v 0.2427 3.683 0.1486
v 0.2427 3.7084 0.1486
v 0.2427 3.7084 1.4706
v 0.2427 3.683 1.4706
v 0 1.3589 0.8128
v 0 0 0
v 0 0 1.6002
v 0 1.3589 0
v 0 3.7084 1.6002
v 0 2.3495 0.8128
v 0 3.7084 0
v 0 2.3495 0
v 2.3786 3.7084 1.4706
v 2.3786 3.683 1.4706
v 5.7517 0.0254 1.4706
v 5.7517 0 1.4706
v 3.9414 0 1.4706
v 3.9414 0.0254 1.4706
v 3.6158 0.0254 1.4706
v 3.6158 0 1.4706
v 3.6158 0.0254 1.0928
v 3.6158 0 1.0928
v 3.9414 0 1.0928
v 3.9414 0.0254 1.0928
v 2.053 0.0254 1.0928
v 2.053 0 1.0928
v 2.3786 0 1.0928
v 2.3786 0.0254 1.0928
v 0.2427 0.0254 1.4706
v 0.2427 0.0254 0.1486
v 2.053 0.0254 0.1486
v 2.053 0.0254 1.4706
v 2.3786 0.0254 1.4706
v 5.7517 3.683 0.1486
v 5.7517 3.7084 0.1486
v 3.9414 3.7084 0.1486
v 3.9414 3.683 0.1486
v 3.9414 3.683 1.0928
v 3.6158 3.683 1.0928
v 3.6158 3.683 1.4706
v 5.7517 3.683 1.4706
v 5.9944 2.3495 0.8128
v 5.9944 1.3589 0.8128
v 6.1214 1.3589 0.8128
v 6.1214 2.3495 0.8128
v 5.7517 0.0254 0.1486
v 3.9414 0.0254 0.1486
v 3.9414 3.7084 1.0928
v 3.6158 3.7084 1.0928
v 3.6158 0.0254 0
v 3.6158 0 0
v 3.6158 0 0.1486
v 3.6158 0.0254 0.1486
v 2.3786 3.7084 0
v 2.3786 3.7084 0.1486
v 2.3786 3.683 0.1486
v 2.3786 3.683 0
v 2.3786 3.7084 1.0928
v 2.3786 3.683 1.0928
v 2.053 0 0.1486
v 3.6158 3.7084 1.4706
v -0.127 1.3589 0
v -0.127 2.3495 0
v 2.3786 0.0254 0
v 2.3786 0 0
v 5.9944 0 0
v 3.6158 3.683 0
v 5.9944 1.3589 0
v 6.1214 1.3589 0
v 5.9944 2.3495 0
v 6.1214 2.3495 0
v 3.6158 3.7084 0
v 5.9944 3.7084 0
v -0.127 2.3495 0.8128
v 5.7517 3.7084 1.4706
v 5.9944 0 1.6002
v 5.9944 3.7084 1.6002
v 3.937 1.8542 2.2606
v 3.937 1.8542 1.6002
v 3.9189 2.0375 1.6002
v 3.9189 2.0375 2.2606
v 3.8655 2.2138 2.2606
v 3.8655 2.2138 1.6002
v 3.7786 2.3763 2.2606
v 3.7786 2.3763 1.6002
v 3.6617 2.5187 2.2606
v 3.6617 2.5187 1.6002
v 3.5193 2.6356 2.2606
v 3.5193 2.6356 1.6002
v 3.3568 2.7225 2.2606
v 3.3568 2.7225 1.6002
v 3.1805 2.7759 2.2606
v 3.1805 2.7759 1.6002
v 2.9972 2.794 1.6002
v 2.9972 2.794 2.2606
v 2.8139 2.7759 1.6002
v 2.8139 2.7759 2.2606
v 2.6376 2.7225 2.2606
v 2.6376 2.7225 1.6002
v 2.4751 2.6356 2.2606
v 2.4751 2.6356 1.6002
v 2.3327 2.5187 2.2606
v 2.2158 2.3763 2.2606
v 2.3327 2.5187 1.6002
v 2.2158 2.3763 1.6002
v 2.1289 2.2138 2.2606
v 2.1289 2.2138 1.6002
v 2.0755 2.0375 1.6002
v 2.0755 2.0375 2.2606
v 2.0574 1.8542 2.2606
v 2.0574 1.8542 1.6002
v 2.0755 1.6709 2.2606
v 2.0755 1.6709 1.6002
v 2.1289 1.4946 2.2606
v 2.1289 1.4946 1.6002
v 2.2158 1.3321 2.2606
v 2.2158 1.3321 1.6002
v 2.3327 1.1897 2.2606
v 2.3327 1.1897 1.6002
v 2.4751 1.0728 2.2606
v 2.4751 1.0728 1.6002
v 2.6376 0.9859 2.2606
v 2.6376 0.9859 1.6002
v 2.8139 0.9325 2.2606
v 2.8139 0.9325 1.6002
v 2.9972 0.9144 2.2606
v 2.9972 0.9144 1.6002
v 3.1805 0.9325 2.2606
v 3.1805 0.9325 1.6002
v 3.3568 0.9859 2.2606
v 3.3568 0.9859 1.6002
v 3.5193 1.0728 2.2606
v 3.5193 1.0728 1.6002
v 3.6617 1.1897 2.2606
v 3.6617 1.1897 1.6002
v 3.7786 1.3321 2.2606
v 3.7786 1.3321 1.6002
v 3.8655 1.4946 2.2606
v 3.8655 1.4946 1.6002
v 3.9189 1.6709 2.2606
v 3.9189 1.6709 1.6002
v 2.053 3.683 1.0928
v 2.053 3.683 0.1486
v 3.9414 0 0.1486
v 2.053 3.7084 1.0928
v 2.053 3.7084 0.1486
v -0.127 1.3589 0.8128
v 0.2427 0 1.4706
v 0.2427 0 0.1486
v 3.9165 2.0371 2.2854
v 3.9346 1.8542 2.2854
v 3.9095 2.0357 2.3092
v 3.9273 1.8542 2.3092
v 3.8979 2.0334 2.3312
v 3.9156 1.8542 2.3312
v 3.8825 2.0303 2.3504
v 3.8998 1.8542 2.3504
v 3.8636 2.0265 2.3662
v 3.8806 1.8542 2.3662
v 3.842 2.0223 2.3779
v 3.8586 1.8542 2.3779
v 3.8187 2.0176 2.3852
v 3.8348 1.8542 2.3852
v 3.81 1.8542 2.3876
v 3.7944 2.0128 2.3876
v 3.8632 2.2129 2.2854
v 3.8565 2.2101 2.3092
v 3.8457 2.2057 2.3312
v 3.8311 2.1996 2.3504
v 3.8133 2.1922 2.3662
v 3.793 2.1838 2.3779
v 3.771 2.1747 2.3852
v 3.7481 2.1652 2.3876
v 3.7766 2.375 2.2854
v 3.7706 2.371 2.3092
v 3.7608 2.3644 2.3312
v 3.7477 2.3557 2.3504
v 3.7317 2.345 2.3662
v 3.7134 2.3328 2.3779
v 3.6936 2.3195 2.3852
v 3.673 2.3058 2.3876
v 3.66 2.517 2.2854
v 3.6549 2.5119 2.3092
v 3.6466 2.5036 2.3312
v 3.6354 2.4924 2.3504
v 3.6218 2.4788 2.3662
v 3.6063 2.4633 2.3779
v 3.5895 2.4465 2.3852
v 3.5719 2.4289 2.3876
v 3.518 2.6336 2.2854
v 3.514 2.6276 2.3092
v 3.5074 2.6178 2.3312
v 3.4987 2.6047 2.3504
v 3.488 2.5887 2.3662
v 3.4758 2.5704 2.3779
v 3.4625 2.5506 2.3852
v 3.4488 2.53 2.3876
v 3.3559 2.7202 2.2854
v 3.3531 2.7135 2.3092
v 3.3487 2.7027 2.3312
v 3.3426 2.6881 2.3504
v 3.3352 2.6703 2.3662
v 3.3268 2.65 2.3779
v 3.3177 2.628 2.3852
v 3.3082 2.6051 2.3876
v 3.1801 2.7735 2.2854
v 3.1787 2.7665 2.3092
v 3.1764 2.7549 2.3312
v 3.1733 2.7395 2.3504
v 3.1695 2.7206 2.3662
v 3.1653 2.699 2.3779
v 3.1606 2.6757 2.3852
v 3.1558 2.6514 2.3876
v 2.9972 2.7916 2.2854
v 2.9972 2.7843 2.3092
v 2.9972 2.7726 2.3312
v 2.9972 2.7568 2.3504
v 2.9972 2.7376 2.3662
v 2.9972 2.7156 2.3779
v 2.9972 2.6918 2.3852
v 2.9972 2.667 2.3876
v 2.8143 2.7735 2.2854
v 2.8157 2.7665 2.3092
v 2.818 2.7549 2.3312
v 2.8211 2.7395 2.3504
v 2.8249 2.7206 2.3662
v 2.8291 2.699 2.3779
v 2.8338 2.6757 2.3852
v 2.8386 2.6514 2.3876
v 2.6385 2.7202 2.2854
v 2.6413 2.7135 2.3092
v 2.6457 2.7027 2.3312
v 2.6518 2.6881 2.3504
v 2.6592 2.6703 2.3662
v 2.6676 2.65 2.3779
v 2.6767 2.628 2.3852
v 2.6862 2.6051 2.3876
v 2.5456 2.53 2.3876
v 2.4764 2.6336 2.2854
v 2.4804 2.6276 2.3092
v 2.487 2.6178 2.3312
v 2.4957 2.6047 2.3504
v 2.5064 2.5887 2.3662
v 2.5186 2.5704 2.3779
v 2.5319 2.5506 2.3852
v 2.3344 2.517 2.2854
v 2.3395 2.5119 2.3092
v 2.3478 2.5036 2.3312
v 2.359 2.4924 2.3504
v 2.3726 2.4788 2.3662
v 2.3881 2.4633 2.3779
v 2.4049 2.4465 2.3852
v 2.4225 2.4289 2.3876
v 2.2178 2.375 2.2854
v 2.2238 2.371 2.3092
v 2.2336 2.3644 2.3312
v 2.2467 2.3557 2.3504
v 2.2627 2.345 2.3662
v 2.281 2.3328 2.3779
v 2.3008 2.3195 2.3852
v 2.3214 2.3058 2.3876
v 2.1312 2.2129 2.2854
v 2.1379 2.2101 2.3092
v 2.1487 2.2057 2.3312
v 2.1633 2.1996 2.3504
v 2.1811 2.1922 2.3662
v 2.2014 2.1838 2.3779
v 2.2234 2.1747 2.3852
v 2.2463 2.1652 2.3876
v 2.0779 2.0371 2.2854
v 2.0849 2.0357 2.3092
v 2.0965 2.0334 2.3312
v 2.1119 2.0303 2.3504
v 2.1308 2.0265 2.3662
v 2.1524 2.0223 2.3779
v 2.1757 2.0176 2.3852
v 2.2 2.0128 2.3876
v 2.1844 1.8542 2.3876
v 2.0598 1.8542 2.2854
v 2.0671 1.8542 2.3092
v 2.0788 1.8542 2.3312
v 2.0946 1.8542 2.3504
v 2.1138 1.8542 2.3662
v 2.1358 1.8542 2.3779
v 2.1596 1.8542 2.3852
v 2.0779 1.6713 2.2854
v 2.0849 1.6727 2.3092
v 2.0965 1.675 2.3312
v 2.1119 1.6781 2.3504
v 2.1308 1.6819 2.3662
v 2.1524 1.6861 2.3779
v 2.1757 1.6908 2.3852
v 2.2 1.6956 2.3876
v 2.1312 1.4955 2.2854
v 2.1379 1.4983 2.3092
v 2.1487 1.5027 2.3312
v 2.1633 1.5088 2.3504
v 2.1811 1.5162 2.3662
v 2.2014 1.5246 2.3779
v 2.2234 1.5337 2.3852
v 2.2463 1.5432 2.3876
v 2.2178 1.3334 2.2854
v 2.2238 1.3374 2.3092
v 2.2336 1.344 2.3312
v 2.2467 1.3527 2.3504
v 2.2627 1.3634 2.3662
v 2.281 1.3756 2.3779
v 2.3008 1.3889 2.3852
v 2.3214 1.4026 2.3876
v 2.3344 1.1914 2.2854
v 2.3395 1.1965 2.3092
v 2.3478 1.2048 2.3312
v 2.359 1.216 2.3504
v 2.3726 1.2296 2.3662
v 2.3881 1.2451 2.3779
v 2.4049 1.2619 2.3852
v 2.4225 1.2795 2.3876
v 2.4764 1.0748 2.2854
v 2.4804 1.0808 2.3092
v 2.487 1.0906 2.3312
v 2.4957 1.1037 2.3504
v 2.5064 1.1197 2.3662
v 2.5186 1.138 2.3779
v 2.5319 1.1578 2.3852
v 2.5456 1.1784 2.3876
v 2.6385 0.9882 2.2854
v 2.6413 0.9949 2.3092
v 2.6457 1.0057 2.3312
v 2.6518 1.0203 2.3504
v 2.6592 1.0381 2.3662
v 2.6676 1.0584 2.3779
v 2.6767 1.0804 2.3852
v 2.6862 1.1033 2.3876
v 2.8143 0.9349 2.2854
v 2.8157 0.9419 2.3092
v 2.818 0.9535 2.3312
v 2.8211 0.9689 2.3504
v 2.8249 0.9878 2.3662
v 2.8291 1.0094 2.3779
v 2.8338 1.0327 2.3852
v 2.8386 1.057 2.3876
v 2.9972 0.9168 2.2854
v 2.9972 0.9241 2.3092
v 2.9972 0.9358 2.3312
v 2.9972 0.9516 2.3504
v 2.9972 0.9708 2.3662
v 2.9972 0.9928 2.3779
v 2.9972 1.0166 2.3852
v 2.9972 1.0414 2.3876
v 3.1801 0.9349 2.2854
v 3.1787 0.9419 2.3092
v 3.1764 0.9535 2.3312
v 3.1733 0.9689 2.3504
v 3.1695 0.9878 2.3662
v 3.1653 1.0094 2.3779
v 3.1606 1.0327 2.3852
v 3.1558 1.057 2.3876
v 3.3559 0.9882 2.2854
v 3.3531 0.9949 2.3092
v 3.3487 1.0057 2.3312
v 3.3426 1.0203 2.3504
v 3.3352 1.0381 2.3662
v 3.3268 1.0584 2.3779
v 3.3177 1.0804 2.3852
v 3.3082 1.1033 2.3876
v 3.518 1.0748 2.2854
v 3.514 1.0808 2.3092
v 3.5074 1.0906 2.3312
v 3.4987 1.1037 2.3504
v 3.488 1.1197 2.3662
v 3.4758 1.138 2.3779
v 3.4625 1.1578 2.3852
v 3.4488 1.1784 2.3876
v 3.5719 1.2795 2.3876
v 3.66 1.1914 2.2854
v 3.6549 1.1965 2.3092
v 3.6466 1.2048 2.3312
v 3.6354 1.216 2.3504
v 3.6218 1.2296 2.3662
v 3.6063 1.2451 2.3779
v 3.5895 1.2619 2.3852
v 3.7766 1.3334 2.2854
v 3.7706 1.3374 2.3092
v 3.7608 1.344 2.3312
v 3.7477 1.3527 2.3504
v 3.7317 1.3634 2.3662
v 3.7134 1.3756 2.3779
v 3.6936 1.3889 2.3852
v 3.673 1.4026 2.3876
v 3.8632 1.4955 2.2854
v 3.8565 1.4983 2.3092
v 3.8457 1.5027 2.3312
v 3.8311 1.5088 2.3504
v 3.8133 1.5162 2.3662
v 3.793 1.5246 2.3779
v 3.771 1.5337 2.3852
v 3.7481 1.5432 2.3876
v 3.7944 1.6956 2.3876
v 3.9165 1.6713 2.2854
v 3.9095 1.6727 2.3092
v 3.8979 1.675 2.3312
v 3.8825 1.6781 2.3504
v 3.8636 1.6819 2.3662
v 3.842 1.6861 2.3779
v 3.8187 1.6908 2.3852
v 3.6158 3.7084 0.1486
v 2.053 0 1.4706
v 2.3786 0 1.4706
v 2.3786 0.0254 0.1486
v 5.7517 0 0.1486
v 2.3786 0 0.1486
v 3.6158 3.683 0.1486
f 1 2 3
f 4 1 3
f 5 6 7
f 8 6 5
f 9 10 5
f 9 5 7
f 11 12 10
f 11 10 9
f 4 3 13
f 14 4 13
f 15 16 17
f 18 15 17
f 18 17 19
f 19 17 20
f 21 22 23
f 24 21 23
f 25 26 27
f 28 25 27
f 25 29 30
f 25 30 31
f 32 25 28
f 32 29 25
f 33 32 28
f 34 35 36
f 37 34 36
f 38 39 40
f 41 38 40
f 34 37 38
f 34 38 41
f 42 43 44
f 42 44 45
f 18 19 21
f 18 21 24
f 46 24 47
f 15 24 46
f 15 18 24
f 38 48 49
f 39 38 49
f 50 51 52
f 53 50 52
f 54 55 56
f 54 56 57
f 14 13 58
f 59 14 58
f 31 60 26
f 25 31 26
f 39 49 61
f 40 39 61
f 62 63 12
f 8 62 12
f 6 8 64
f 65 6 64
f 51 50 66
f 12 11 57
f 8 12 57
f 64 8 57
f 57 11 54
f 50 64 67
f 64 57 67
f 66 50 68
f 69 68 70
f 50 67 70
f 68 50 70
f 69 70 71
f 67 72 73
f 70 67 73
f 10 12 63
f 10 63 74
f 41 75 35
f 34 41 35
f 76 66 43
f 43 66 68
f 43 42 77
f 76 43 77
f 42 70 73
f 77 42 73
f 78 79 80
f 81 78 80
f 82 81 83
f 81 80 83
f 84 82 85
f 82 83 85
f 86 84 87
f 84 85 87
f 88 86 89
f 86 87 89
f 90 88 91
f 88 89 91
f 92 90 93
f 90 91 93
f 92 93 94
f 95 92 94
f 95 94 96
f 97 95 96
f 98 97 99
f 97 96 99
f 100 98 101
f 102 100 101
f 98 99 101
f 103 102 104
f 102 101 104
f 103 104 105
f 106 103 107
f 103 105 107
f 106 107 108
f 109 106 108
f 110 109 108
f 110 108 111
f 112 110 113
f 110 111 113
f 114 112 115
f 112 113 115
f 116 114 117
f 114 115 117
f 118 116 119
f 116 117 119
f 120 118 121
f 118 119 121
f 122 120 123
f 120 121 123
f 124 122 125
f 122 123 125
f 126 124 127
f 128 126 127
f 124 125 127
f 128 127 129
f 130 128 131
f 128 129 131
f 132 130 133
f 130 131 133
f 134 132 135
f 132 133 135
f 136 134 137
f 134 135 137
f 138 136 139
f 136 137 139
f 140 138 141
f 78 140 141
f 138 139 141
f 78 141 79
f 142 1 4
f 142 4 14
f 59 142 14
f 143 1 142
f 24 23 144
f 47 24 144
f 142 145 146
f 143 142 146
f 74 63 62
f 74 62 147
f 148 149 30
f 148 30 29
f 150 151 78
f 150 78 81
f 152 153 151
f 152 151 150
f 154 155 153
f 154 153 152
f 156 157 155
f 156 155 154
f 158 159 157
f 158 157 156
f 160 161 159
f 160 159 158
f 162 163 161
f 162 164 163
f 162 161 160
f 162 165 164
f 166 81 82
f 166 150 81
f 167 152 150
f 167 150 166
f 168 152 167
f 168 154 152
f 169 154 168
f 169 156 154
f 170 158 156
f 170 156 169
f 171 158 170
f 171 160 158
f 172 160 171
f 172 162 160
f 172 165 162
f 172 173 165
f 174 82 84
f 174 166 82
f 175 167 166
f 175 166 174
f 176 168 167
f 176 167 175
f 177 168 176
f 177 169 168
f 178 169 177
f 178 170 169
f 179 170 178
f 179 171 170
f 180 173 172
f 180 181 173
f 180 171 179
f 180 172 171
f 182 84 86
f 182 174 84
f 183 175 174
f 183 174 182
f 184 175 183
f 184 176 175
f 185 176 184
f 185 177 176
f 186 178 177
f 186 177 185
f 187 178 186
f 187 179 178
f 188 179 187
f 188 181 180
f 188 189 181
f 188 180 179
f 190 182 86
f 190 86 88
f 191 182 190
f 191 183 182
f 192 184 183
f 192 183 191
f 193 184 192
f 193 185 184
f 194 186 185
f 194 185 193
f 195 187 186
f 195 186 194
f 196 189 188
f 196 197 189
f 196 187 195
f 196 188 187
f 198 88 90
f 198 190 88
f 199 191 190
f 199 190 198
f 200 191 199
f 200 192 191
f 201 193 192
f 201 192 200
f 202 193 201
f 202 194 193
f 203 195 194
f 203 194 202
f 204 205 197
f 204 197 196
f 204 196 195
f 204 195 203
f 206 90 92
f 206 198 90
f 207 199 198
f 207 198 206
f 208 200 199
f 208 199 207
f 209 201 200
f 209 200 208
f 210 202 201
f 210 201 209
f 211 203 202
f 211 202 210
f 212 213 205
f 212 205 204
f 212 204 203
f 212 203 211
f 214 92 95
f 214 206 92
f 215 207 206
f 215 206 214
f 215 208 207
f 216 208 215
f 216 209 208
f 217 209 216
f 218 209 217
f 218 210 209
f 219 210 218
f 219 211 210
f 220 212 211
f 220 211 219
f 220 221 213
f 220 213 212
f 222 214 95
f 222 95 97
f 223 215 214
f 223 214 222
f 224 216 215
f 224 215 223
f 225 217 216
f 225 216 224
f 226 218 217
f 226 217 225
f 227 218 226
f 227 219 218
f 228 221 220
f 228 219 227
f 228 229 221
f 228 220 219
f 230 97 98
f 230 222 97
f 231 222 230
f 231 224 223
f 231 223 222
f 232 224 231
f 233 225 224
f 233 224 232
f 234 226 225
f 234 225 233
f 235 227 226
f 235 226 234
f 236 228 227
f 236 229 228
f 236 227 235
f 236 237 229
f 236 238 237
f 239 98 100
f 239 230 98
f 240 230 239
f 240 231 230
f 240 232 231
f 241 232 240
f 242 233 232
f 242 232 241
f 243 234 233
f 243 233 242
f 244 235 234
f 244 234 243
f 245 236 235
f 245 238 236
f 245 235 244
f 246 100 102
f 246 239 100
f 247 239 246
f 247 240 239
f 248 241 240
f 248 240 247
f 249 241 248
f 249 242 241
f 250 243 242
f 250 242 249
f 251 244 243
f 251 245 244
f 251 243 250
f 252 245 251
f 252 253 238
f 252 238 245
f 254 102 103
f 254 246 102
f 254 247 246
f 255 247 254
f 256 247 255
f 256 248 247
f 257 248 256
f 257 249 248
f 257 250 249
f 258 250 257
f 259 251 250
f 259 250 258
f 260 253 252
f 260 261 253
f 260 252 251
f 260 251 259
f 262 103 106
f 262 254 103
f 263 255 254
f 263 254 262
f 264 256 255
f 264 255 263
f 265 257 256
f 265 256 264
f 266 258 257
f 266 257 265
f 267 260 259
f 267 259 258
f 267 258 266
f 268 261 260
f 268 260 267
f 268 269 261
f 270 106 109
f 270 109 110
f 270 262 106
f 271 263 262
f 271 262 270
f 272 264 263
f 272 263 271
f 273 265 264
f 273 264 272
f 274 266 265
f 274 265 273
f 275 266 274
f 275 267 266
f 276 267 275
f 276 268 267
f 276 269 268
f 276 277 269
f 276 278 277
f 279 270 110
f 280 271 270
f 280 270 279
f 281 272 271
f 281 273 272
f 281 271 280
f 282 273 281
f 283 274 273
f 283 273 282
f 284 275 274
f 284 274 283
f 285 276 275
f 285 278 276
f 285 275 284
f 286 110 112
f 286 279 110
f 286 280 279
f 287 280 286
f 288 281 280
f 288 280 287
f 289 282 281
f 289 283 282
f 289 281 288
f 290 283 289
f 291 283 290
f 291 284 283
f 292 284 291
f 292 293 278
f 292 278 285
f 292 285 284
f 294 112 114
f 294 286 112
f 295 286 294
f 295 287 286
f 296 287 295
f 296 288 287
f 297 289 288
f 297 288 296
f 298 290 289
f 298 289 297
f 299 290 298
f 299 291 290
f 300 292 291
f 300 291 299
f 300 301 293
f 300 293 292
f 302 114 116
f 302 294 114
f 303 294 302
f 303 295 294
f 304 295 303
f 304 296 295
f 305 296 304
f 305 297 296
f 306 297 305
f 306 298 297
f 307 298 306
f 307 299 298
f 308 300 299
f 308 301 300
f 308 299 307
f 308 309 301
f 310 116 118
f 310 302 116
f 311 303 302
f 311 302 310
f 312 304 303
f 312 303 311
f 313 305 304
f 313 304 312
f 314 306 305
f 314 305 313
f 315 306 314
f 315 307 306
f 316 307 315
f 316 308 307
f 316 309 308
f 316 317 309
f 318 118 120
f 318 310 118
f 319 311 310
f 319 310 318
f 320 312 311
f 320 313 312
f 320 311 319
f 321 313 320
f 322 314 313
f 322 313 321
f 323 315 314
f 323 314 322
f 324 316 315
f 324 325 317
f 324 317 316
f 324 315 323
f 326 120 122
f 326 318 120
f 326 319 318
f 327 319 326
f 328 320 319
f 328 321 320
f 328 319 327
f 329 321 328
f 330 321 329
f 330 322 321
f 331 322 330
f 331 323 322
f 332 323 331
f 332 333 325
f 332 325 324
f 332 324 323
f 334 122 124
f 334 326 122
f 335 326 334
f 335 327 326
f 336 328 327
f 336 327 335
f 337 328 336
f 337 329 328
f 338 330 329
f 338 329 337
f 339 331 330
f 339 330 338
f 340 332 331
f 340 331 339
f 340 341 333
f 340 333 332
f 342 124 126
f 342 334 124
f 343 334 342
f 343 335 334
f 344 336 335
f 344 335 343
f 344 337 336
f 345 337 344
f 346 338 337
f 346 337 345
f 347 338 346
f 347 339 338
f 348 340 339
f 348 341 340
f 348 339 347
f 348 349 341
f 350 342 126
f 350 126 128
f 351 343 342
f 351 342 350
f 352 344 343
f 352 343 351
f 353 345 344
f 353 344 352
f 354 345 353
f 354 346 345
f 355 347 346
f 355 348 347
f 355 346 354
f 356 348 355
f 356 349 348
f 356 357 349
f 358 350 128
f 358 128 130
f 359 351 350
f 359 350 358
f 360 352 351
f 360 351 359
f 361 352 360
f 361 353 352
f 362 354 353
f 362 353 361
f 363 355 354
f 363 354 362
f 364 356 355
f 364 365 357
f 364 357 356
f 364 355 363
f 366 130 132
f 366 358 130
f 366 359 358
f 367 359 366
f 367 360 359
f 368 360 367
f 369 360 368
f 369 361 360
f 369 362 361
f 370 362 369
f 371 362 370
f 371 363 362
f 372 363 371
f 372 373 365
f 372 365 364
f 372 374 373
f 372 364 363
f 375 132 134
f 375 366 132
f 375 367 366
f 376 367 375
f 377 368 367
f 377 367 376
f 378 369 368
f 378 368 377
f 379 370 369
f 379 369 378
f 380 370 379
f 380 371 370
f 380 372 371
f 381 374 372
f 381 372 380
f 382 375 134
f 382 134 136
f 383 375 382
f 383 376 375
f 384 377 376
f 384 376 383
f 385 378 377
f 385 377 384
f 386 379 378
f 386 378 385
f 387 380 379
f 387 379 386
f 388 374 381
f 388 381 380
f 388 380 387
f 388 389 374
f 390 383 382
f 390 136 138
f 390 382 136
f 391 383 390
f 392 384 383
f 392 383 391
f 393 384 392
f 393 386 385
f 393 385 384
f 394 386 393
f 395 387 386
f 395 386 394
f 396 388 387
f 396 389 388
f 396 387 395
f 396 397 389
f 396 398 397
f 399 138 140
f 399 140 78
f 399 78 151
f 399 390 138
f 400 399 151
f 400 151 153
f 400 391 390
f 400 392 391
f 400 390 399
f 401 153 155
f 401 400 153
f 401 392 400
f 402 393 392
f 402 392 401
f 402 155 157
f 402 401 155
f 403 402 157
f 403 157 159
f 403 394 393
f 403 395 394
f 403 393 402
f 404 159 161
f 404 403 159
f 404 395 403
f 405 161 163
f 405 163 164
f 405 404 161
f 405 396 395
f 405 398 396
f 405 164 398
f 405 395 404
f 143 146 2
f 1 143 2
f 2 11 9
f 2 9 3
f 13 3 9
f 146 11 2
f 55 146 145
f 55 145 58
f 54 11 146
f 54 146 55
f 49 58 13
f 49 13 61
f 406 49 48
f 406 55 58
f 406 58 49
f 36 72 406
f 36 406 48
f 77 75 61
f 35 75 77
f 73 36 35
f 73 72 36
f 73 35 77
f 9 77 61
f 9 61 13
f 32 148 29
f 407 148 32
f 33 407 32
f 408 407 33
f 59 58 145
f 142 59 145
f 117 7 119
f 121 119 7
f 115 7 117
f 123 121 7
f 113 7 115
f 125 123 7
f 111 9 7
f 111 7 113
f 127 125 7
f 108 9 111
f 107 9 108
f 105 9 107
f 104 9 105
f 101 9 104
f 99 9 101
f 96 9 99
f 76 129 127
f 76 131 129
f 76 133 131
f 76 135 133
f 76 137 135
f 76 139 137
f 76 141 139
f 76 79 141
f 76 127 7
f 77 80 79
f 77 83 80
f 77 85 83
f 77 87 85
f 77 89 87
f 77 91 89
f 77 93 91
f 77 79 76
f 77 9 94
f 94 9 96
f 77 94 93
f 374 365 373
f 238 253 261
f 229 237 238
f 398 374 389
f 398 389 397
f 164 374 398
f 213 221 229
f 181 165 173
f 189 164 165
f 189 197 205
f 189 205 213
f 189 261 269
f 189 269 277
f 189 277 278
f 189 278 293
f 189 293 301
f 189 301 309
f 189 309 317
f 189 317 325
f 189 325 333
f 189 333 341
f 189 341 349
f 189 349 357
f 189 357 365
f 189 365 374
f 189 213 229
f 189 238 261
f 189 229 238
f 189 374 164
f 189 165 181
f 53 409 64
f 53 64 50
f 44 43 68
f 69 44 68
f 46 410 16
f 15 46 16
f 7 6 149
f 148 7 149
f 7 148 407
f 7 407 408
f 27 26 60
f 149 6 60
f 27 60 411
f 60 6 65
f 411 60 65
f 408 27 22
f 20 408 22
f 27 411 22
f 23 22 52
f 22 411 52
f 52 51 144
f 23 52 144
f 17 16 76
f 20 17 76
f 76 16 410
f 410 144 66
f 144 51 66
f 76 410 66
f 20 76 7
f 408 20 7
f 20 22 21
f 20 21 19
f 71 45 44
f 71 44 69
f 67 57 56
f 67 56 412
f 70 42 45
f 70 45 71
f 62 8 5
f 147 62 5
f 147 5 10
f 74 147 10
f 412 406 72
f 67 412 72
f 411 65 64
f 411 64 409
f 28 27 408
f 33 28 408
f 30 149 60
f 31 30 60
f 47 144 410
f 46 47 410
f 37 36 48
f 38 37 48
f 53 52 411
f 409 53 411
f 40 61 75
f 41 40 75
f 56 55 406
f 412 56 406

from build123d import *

# Parameters (mm, degrees)
SKETCH1_W           = 5.9944
SKETCH1_H           = 3.7084
BOSS_EXTRUDE1_DEPTH = 1.6002
SKETCH2_R           = 0.9398
BOSS_EXTRUDE2_DEPTH = 0.7874
SKETCH3_W           = 0.8128
SKETCH3_H           = 0.9906
BOSS_EXTRUDE3_DEPTH = 0.127
SKETCH4_W           = 0.8128
SKETCH4_H           = 0.9906
BOSS_EXTRUDE4_DEPTH = 0.127
SKETCH5_W           = 1.810256369
SKETCH5_H           = 1.321990986
SKETCH5_W_2         = 0.325593494
SKETCH5_H_2         = 0.377769853
SKETCH5_W_3         = 0.618627639
SKETCH5_H_3         = 0.148619884
CUT_EXTRUDE1_DEPTH  = 0.0254
SKETCH6_W           = 1.237255278
SKETCH6_H           = 0.148619884
CUT_EXTRUDE2_DEPTH  = 0.0254
FILLET1_R           = 0.127


with BuildPart() as part:
    # Sketch1 → Boss-Extrude1 (new body)
    with BuildSketch(Plane.XY):
        with Locations((2.9972, 1.8542)):
            Rectangle(SKETCH1_W, SKETCH1_H)
    extrude(amount=BOSS_EXTRUDE1_DEPTH)

    # Sketch2 → Boss-Extrude2 (add)
    with BuildSketch(Plane.XY.offset(1.6002)):
        with Locations((2.9972, 1.8542)):
            Circle(SKETCH2_R)
    extrude(amount=BOSS_EXTRUDE2_DEPTH)

    # Sketch3 → Boss-Extrude3 (add)
    with BuildSketch(Plane.ZY):
        with Locations((0.4064, 1.8542)):
            Rectangle(SKETCH3_W, SKETCH3_H)
    extrude(amount=BOSS_EXTRUDE3_DEPTH)

    # Sketch4 → Boss-Extrude4 (add)
    with BuildSketch(Plane(origin=(5.9944, 0, 0), x_dir=(0, 0, -1), z_dir=(1, 0, 0))):
        with Locations((-0.4064, 1.8542)):
            Rectangle(SKETCH4_W, SKETCH4_H)
    extrude(amount=BOSS_EXTRUDE4_DEPTH)

    # Sketch5 → Cut-Extrude1 (cut)
    with BuildSketch(Plane.XZ):
        with Locations((1.147850683, 0.809615377)):
            Rectangle(SKETCH5_W, SKETCH5_H)
        with Locations((2.215775614, 1.281725944)):
            Rectangle(SKETCH5_W_2, SKETCH5_H_2)
        with Locations((3.778624386, 1.281725944)):
            Rectangle(SKETCH5_W_2, SKETCH5_H_2)
        Polygon((5.751677502, 1.47061087), (3.941421133, 1.47061087), (3.941421133, 1.092841017), (3.941421133, 0.148619884), (5.751677502, 0.148619884), align=None)
        with Locations((2.687886181, 0.074309942)):
            Rectangle(SKETCH5_W_3, SKETCH5_H_3)
        with Locations((3.30651382, 0.074309942)):
            Rectangle(SKETCH5_W_3, SKETCH5_H_3)
    extrude(amount=-CUT_EXTRUDE1_DEPTH, mode=Mode.SUBTRACT)

    # Sketch6 → Cut-Extrude2 (cut)
    with BuildSketch(Plane(origin=(0, 3.7084, 0), x_dir=(1, 0, 0), z_dir=(0, 1, 0))):
        Polygon((3.941421133, -1.092841017), (3.615827639, -1.092841017), (3.615827639, -1.47061087), (5.751677502, -1.47061087), (5.751677502, -0.148619884), (3.941421133, -0.148619884), align=None)
        Polygon((2.052978867, -0.148619884), (0.242722498, -0.148619884), (0.242722498, -1.47061087), (2.378572361, -1.47061087), (2.378572361, -1.092841017), (2.052978867, -1.092841017), align=None)
        with Locations((2.9972, -0.074309942)):
            Rectangle(SKETCH6_W, SKETCH6_H)
    extrude(amount=-CUT_EXTRUDE2_DEPTH, mode=Mode.SUBTRACT)

    # Fillet1
    fillet1_edges = [part.edges().sort_by_distance(p)[0] for p in [
        (2.0574, 1.8542, 2.3876),
    ]]
    fillet(fillet1_edges, radius=FILLET1_R)


solid = part.part
